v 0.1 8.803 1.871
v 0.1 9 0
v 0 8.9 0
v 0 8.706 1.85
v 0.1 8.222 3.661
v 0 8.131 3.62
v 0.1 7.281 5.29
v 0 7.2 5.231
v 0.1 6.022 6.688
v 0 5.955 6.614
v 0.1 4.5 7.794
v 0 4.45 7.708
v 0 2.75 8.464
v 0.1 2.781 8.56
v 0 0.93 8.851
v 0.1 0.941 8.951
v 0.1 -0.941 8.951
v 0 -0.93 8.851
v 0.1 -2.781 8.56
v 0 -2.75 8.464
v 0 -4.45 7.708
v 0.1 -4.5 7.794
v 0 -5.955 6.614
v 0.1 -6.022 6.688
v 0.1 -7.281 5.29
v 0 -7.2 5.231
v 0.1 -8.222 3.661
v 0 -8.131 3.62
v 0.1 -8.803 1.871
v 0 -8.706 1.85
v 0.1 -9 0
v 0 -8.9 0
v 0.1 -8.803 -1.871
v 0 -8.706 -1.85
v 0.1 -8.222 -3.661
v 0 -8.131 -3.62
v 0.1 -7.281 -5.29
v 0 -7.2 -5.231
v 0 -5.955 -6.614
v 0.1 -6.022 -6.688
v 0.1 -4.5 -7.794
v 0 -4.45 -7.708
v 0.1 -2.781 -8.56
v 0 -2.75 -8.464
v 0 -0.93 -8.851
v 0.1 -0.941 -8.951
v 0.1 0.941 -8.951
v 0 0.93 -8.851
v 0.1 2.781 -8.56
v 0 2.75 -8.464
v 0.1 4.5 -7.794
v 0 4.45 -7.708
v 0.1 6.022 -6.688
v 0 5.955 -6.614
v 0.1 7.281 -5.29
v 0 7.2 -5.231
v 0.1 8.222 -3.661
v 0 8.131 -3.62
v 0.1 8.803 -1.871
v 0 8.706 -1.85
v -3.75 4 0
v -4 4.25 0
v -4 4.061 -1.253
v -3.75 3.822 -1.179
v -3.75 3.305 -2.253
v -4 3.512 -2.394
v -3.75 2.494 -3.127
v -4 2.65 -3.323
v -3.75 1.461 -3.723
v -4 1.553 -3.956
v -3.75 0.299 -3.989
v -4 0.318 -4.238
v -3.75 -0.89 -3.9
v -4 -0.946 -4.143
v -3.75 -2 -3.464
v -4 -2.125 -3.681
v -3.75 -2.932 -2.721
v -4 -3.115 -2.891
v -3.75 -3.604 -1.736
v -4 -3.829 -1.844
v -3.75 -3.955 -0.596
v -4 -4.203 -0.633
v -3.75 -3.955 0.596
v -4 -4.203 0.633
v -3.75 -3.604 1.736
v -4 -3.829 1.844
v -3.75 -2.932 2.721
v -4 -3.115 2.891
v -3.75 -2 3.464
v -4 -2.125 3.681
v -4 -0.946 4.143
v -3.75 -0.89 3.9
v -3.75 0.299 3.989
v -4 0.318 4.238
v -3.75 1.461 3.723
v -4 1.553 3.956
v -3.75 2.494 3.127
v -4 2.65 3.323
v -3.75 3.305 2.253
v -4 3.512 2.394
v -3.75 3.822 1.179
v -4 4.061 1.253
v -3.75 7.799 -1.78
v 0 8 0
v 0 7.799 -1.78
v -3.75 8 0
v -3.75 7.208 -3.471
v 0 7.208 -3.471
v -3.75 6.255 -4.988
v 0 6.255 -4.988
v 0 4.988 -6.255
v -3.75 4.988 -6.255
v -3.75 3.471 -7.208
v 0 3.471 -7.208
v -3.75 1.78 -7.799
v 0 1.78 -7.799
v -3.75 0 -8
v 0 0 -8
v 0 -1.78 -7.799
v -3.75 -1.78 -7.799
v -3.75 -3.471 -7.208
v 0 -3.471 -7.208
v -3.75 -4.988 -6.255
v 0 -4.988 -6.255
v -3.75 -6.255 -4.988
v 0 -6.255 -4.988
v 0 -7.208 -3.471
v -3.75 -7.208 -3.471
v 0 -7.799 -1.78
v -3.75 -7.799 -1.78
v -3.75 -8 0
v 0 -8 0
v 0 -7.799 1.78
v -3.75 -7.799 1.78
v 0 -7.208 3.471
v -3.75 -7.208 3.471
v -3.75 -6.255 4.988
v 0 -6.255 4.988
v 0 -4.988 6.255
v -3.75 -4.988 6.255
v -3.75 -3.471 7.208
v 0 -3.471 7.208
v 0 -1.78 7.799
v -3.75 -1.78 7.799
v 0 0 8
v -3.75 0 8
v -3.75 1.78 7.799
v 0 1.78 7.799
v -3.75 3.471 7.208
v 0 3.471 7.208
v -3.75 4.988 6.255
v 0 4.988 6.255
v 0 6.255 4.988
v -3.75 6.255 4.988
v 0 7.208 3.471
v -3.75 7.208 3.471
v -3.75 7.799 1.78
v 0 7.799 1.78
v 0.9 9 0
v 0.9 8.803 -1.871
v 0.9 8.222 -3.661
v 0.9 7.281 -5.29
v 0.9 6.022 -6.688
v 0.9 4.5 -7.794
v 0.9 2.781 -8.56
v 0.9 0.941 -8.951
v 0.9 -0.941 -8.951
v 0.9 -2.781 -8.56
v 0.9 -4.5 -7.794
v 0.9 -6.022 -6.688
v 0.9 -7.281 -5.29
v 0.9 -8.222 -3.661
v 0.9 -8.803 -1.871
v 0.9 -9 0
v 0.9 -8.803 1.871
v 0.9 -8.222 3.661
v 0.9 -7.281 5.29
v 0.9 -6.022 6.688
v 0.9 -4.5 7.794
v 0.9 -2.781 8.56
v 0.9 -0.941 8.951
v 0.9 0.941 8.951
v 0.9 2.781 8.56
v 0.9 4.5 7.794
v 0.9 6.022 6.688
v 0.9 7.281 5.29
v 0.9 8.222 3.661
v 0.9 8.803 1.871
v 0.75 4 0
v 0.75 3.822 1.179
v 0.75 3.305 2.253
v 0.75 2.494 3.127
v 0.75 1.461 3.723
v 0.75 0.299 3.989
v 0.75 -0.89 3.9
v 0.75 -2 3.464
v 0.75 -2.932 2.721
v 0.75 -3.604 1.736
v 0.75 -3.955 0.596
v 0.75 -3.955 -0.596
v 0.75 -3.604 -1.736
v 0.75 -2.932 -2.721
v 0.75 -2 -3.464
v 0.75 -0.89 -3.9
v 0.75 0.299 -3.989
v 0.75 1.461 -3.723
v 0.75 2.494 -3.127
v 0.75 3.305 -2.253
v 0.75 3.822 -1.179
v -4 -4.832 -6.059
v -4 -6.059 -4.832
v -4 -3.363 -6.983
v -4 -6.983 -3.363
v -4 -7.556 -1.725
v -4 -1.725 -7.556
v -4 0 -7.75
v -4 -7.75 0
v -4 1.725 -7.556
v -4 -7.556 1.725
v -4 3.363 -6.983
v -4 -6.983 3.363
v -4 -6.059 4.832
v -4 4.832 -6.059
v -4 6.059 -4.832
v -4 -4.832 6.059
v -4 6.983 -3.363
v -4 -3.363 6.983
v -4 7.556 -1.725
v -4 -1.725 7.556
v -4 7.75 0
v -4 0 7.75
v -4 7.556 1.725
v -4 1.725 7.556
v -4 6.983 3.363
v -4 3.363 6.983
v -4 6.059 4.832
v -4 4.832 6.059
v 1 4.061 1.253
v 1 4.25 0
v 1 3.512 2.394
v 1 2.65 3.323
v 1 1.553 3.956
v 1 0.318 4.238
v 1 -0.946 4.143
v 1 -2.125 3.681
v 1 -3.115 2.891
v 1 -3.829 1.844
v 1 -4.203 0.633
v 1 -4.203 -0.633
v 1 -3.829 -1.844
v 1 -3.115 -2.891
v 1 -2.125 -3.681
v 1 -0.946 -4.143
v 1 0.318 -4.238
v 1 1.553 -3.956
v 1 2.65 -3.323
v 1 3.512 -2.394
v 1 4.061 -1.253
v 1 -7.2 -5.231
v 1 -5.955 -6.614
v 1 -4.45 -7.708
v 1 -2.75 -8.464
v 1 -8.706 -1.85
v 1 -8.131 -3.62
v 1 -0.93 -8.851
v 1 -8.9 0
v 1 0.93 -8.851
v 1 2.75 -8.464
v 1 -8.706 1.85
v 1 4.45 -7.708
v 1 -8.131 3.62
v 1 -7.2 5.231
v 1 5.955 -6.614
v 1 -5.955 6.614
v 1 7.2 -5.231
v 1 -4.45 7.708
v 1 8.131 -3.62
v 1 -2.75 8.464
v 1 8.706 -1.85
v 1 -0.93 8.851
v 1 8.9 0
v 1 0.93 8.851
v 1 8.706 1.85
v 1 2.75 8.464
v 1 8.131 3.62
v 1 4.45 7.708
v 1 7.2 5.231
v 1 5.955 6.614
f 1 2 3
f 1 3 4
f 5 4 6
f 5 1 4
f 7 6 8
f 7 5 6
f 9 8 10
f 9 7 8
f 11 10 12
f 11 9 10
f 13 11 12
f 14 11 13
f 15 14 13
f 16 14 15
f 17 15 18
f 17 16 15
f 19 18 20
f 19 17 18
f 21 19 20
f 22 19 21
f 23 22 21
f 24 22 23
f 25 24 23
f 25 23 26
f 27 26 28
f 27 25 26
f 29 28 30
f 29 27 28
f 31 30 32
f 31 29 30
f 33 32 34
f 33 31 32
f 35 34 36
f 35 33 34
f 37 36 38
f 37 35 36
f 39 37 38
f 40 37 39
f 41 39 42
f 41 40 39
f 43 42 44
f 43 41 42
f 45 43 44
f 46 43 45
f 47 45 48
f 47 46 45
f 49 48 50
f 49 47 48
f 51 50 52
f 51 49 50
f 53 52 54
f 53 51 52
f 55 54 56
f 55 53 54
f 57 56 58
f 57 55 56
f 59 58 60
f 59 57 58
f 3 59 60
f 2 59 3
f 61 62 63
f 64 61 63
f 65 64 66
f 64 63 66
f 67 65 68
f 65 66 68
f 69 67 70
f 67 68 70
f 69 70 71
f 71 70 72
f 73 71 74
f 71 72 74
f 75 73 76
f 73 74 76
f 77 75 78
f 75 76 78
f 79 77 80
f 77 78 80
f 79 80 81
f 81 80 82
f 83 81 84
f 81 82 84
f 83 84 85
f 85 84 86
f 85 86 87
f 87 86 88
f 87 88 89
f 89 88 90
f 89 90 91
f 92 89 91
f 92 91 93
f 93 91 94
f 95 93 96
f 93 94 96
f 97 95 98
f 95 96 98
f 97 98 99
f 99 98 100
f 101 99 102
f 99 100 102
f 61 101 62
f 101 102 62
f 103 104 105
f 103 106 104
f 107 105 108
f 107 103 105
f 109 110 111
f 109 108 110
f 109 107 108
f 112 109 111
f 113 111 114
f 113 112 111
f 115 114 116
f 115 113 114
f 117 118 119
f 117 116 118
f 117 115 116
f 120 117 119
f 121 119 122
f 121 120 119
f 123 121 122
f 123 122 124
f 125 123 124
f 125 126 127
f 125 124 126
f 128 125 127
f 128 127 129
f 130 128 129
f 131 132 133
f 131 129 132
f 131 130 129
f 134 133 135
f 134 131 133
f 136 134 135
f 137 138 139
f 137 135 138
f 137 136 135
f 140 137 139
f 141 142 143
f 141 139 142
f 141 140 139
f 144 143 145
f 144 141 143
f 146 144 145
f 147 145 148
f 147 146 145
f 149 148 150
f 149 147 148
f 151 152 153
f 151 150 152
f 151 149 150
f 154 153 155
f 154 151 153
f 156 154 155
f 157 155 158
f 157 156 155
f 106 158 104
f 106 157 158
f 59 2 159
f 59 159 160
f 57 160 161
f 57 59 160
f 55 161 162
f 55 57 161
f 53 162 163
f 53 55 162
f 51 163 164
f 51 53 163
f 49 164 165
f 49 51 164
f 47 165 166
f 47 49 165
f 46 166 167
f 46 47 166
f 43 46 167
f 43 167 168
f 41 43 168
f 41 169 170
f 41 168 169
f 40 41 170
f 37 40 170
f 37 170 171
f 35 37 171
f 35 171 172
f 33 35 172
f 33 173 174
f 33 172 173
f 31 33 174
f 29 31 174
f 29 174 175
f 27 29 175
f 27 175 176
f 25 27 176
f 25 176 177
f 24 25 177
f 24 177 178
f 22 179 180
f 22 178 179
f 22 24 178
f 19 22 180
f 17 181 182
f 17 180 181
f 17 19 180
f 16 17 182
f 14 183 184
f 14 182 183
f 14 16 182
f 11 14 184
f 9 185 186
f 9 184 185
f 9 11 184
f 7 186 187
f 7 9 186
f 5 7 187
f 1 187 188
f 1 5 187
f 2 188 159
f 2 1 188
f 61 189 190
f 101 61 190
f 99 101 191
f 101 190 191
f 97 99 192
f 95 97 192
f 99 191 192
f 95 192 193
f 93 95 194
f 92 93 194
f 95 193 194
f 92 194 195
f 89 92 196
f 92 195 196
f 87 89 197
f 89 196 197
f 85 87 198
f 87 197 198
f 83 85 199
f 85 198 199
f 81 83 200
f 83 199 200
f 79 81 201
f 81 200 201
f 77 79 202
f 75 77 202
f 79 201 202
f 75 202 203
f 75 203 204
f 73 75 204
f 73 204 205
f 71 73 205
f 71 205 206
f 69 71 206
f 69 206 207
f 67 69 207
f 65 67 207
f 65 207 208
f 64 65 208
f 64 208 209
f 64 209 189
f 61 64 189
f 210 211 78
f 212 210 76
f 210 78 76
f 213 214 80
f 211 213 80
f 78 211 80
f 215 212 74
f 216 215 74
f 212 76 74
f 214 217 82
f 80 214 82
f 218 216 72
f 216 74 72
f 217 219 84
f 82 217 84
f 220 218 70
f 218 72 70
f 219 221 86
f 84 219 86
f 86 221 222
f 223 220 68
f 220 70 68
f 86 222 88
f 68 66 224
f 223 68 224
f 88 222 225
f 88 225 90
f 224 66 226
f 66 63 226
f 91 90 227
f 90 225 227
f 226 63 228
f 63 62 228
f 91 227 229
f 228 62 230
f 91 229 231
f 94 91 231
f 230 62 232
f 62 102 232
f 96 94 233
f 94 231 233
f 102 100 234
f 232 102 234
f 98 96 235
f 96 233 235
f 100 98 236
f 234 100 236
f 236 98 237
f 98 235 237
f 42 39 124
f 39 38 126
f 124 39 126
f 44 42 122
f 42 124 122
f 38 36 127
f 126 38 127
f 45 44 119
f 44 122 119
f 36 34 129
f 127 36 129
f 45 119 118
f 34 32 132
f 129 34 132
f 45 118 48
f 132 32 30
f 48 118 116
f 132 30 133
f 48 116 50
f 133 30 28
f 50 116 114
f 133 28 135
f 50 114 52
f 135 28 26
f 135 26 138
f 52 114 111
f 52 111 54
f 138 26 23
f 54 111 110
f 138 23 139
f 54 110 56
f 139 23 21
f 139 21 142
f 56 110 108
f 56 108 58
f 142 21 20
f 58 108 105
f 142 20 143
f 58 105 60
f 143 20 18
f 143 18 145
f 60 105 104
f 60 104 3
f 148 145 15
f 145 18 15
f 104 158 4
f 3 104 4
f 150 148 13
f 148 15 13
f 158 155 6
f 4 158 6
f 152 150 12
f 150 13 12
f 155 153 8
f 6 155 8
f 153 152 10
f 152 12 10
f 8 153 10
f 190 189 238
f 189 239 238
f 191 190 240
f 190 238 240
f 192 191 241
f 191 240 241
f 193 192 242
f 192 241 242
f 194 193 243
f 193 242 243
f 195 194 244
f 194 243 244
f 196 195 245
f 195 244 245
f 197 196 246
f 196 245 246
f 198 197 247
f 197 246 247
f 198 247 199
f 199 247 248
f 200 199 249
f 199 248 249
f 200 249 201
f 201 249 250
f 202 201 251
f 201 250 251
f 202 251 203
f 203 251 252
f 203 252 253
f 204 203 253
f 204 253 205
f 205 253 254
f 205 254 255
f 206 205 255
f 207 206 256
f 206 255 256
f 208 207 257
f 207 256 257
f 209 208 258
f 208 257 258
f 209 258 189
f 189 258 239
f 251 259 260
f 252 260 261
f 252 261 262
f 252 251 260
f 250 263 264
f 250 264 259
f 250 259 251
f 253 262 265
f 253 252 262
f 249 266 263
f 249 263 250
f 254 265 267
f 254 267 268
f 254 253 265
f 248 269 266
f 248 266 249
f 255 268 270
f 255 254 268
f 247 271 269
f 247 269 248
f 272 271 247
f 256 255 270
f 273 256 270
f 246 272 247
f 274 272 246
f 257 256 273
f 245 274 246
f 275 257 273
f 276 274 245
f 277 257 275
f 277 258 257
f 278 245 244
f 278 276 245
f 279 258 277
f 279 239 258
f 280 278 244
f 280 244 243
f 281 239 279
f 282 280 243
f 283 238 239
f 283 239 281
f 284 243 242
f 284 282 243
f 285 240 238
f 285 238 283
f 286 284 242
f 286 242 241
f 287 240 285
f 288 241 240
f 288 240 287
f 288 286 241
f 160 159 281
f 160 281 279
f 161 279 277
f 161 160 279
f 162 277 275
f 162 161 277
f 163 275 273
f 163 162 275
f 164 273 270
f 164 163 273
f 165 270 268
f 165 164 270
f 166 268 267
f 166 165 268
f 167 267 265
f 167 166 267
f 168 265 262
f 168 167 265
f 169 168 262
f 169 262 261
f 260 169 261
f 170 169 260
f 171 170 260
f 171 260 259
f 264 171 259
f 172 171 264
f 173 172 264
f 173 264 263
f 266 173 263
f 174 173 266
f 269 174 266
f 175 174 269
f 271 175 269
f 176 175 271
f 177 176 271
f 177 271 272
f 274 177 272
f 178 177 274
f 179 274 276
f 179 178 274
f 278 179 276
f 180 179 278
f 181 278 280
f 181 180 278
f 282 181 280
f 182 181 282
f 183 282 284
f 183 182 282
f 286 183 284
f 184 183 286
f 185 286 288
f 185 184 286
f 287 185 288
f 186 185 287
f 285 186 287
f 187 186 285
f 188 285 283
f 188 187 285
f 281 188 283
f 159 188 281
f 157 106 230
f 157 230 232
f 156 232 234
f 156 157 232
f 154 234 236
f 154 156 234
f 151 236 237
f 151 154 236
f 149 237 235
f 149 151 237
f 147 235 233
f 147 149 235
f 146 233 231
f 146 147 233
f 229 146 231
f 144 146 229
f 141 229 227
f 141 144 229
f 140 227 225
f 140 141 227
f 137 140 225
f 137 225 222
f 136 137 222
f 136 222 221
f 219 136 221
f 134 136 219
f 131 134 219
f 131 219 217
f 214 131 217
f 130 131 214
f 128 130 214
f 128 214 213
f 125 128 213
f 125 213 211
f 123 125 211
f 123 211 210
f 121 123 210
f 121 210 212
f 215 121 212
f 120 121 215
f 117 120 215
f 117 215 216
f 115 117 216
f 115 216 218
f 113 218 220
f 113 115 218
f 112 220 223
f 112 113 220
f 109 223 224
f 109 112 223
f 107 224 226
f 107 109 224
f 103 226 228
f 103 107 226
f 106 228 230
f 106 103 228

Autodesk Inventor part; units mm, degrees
ref_plane "YZ Plane" through (0, 0, 0) normal (1, 0, 0) x (0, 1, 0)
ref_plane "XZ Plane" through (0, 0, 0) normal (0, 1, 0) x (-1, 0, 0)
ref_plane "XY Plane" through (0, 0, 0) normal (0, 0, 1) x (1, 0, 0)
sketch "Skizze1" plane through (0, 0, 0) normal (0, 0, 1) x (1, 0, 0)
  line L0 (-18.8104, 0) -> (17.0467, 0)
  line L1 (-3.75, 4) -> (0.75, 4)
  line L2 (1, 4.25) -> (1, 8.9)
  line L3 (0.9, 9) -> (0.1, 9)
  line L4 (0, 8.9) -> (0, 8)
  line L5 (0, 8) -> (-3.75, 8)
  line L6 (-4, 7.75) -> (-4, 4.25)
  line L7 (-3.75, 8) -> (-4, 7.75)
  line L8 (-3.75, 4) -> (-4, 4.25)
  line L9 (0.75, 4) -> (1, 4.25)
  line L10 (0.1, 9) -> (0, 8.9)
  line L11 (1, 8.9) -> (0.9, 9)
  point P0 (0, 0)
  point P1 (-4, 4)
  point P2 (1, 4)
  point P3 (1, 9)
  point P4 (0, 9)
  point P5 (-4, 8)
  dimension "d0" = 5
  dimension "d1" = 18
  dimension "d2" = 1
  dimension "d3" = 16
  dimension "d4" = 8
  dimension "d5" = 0.25
  dimension "d6" = 0.25
  dimension "d7" = 0.25
  dimension "d8" = 0.25
  dimension "d9" = 0.25
  dimension "d10" = 0.25
  dimension "d11" = 0.1
  dimension "d12" = 0.1
  dimension "d13" = 0.1
  dimension "d14" = 0.1
revolve "Umdrehung1" add sketch "Skizze1" angle 360 about axis through (-18.8104, 0, 0) along (1, 0, 0)
equation "\"d6\" = d5"
equation "\"d7\" = d5"
equation "\"d8\" = d7"
equation "\"d9\" = d5"
equation "\"d10\" = d9"
equation "\"d12\" = d11"
equation "\"d14\" = d13"
properties part number "F688ZZ_V1" material "Stahl, Legierung"
